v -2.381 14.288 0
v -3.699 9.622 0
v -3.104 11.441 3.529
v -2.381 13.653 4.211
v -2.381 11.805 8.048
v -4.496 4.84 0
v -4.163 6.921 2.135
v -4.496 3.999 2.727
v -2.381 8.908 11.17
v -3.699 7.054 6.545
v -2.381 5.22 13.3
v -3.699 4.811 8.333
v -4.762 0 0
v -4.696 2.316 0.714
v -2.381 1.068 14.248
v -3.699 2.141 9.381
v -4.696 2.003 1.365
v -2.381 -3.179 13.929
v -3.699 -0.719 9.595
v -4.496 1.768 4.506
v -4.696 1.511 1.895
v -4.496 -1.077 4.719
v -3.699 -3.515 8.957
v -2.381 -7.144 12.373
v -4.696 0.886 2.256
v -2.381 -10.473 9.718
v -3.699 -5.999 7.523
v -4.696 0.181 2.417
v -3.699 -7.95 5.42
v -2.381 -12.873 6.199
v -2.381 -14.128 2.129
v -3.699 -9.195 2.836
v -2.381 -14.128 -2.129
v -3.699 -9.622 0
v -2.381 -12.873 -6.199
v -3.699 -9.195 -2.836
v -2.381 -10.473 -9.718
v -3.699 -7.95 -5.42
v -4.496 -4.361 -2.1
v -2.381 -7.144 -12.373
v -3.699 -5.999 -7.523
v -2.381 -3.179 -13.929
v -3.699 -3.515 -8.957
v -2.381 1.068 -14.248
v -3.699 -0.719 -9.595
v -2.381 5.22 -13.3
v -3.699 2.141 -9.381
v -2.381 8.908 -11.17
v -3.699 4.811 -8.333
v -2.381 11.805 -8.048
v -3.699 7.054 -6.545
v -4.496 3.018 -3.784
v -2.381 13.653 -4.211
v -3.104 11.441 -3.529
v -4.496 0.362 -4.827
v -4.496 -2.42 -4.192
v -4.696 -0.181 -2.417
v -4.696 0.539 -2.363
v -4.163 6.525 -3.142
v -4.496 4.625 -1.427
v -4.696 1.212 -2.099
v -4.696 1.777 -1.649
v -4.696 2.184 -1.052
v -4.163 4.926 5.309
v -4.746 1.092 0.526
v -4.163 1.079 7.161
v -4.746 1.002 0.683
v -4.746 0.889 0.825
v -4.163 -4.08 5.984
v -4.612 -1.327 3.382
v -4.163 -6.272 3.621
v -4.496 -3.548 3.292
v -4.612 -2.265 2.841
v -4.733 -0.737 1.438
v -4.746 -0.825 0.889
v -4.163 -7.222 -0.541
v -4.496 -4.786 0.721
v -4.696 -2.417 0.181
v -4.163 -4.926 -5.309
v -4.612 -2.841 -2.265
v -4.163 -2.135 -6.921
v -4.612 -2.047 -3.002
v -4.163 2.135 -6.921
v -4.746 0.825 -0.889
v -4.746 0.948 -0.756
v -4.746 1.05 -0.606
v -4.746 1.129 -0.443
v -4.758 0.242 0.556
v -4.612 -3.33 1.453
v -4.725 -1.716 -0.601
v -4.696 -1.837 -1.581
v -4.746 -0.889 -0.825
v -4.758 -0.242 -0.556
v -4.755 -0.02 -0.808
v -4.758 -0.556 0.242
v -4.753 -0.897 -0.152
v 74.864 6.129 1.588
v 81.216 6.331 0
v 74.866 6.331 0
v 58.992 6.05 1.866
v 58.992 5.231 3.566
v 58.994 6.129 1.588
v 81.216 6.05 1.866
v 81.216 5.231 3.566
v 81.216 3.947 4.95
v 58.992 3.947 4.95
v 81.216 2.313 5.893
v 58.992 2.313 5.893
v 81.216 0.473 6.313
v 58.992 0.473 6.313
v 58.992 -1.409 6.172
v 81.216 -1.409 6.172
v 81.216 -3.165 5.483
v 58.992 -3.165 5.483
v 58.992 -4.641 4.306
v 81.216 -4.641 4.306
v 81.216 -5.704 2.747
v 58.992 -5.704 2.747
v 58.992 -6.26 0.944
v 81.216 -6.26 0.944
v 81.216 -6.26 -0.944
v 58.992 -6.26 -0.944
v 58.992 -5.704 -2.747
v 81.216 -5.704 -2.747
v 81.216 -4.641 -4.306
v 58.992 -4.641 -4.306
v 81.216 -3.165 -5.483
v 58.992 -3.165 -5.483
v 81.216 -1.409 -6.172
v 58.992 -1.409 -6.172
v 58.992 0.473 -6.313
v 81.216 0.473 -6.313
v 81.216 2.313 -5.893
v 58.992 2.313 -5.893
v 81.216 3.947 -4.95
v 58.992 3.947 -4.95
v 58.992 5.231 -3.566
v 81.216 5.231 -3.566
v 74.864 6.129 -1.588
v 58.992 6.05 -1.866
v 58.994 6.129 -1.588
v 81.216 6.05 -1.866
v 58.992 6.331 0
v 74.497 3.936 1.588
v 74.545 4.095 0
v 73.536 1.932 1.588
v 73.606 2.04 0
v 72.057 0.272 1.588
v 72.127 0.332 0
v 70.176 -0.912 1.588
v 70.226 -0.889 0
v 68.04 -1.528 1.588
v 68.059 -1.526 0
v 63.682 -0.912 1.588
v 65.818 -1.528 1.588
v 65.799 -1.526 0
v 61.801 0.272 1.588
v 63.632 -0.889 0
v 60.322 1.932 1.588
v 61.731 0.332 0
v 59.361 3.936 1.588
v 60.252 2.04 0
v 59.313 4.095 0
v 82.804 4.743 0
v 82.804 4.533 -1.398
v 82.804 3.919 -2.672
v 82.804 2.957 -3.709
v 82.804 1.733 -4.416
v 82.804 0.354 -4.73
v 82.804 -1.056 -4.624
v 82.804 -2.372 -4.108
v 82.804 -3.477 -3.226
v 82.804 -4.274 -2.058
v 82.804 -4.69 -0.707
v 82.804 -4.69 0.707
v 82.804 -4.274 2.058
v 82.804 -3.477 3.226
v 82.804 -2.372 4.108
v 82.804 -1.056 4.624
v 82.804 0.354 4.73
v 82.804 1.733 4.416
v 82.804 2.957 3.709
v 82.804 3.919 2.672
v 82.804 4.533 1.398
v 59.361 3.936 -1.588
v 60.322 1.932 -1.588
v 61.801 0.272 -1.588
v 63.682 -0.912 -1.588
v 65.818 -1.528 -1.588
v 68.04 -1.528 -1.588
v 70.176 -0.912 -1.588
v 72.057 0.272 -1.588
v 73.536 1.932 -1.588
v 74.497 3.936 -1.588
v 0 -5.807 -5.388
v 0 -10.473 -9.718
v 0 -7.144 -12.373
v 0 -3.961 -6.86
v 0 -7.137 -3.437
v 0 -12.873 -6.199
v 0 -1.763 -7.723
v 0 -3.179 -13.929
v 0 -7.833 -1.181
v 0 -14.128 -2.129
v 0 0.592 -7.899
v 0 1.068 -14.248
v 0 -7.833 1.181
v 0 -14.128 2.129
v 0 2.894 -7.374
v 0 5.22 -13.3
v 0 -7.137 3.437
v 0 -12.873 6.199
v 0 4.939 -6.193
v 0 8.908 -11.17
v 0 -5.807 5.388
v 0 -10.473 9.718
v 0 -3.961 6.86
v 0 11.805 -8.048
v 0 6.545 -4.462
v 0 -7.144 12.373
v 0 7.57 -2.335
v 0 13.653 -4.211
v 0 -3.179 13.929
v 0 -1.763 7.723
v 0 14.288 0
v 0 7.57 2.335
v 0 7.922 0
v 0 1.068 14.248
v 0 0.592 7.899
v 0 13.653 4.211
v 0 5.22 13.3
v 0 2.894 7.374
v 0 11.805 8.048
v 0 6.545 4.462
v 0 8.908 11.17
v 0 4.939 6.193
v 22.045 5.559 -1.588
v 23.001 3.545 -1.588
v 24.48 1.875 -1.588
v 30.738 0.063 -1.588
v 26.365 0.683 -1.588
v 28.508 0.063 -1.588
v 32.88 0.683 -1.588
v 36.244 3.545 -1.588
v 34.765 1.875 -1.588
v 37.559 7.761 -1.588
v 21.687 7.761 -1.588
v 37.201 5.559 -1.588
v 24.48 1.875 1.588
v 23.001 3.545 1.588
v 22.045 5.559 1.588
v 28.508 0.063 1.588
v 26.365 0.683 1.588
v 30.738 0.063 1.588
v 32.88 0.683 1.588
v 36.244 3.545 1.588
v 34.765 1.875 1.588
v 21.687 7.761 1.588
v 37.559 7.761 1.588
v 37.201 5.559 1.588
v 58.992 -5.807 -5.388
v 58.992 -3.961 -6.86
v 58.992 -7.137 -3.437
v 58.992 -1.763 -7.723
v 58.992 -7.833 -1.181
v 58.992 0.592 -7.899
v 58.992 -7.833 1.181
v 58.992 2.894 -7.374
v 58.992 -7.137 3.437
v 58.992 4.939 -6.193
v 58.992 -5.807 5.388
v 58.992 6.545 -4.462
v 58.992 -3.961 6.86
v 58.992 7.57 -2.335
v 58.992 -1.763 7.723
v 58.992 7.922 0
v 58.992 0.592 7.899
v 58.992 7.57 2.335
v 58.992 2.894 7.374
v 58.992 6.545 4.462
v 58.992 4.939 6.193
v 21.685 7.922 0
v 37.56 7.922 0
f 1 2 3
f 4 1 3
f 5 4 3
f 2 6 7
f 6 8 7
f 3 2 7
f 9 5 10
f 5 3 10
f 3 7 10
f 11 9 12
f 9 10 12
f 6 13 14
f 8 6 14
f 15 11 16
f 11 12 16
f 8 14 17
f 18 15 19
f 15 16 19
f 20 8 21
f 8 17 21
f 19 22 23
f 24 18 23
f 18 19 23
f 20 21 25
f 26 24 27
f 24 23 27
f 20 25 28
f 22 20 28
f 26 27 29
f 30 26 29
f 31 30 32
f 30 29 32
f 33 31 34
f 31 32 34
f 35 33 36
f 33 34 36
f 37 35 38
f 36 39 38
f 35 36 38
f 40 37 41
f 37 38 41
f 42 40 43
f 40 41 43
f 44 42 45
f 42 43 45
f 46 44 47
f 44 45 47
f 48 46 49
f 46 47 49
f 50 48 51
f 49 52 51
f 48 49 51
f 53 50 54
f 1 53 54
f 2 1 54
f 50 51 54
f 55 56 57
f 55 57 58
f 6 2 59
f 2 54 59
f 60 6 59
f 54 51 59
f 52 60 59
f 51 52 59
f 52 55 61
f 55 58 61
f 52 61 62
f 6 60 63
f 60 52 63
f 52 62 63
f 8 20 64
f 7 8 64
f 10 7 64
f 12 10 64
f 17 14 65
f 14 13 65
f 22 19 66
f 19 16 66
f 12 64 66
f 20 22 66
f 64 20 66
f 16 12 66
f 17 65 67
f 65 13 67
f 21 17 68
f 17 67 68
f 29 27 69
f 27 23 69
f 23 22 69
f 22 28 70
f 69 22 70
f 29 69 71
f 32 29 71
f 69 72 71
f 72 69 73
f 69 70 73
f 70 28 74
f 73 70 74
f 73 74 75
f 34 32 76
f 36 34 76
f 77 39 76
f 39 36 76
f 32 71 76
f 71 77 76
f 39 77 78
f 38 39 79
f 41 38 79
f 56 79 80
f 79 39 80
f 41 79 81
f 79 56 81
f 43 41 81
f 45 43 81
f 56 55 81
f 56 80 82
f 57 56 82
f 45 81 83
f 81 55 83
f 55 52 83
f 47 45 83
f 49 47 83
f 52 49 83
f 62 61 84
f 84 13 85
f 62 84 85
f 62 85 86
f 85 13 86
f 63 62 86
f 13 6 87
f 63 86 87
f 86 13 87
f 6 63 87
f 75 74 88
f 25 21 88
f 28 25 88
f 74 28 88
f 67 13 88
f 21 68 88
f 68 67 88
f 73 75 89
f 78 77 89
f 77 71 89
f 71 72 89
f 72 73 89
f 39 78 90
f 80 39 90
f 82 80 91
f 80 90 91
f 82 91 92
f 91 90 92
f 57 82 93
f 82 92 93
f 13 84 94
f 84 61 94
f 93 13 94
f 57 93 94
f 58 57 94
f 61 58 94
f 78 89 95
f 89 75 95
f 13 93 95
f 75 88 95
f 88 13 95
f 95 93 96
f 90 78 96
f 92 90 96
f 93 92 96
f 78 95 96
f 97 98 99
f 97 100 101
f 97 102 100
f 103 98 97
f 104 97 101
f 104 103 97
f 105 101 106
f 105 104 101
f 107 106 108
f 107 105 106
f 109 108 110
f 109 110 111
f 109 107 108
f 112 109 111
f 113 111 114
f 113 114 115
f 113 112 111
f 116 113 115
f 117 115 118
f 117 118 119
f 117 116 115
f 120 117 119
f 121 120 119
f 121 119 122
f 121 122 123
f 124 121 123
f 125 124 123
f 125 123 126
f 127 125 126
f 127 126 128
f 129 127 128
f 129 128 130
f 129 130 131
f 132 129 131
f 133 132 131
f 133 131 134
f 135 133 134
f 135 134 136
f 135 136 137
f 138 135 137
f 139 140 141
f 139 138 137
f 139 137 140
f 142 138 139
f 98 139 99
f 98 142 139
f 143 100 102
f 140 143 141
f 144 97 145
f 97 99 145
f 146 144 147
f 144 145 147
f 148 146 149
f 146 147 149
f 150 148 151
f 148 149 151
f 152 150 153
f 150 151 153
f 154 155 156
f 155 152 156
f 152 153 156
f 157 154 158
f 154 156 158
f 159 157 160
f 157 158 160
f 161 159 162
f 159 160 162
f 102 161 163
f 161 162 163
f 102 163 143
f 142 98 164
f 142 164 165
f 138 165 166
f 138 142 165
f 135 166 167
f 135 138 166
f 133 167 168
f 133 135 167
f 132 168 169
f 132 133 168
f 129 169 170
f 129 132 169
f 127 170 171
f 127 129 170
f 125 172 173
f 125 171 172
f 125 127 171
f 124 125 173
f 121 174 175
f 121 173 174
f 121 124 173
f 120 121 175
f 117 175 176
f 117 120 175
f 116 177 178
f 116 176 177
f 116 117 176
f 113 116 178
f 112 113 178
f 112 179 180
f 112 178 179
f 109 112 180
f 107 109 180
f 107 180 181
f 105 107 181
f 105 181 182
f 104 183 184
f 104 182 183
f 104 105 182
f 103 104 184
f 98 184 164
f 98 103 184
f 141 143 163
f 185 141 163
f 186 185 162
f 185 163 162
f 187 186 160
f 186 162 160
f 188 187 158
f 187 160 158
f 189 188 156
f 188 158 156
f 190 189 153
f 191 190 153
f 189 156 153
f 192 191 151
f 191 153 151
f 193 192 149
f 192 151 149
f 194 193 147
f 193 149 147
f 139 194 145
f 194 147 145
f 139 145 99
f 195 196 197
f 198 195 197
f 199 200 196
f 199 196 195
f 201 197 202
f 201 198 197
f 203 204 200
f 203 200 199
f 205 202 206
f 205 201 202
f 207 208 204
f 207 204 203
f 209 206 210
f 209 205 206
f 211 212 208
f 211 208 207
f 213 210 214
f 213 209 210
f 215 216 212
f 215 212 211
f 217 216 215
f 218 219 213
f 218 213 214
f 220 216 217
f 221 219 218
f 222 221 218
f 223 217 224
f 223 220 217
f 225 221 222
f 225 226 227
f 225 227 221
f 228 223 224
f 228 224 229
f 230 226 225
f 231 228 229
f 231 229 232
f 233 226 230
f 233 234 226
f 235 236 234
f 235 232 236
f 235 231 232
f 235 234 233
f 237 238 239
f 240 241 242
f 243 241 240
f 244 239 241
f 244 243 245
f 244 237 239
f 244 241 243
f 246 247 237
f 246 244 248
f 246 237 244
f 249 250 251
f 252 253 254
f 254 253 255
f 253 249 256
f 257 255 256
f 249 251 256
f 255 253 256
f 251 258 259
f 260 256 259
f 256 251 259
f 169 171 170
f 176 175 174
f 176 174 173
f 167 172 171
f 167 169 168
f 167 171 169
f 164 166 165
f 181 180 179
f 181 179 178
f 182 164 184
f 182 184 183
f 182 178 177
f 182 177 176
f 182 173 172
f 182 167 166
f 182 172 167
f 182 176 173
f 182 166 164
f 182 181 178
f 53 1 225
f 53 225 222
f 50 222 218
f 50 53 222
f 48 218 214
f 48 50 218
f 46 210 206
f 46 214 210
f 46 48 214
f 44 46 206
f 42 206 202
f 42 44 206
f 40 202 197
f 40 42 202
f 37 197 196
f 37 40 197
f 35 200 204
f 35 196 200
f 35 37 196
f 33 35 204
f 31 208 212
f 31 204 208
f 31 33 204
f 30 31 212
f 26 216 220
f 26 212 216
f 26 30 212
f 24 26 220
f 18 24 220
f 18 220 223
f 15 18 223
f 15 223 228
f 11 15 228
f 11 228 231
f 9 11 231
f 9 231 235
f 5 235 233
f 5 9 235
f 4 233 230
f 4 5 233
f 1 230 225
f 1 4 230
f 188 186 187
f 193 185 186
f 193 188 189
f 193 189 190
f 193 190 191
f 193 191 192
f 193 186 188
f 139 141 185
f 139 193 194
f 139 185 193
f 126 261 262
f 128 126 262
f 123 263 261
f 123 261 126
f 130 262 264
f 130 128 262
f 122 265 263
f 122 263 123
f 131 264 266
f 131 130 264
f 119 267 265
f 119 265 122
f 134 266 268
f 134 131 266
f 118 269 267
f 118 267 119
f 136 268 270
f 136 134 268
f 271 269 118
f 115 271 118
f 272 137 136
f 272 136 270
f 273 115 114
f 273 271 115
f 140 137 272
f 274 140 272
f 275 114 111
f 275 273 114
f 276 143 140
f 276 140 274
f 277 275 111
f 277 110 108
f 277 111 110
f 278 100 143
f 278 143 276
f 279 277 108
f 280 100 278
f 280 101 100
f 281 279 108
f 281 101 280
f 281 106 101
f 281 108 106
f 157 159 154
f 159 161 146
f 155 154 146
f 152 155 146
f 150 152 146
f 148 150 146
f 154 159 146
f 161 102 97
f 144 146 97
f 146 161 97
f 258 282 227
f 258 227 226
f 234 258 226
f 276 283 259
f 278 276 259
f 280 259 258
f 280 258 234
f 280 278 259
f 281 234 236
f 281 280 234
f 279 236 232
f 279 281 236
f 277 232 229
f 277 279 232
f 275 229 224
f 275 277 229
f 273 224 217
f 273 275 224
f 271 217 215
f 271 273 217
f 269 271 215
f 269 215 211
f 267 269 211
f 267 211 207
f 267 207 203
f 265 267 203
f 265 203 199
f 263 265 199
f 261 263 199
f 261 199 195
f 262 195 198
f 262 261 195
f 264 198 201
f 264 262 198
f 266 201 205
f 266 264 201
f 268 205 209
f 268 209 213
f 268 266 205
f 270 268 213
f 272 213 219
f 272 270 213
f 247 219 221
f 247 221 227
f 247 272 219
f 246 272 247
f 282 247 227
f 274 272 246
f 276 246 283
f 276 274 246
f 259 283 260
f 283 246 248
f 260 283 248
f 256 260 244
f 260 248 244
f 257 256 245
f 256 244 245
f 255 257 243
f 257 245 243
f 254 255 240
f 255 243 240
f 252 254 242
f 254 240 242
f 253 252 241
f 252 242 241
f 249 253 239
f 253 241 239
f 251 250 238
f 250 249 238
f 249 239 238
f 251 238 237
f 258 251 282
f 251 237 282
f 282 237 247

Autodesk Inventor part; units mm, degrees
ref_plane "YZ Plane" through (0, 0, 0) normal (1, 0, 0) x (0, 1, 0)
ref_plane "XZ Plane" through (0, 0, 0) normal (0, 1, 0) x (-1, 0, 0)
ref_plane "XY Plane" through (0, 0, 0) normal (0, 0, 1) x (1, 0, 0)
sketch "Sketch1" plane through (0, 0, 0) normal (0, 0, 1) x (1, 0, 0)
  line L0 (58.9915, 7.9216) -> (58.9915, 6.3309)
  line L1 (58.9915, 6.3309) -> (82.804, 6.3309)
  line L2 (-22.9853, 0) -> (100.4355, 0) projected
  line L3 (0, 7.9216) -> (58.9915, 7.9216)
  line L4 (0, 0) -> (0, 14.2875) construction
  line L5 (0, -5.5981) -> (0, 33.5884) construction
  line L6 (0, 14.2875) -> (0, 7.9216)
  line L7 (82.804, 6.3309) -> (82.804, 0)
  line L8 (-4.7625, 0) -> (82.804, 0)
  line L9 (-4.7625, 0) -> (-4.7625, 27.9903) construction
  line L10 (0, 14.2875) -> (-2.3813, 14.2875)
  arc A0 (-2.3813, 14.2875) -> (-4.7625, 0) centre (39.2906, 0) ccw
  dimension "d4" = 15.8432
  dimension "d6" = 23.8125
  dimension "d8" = 58.9915
  dimension "d9" = 12.6619
  dimension "d10" = 0
  dimension "d16" = 2.3813
  dimension "d17" = 2.3813
  dimension "d18" = 28.575
revolve "Revolution1" add sketch "Sketch1" angle 360 about axis through (-10, 0, 0) along (1, 0, 0)
sketch "Sketch2" plane through (0, 0, 0) normal (0, 0, 1) x (1, 0, 0)
  circle A0 centre (29.6227, 7.9216) radius 7.9375
  circle A1 centre (66.929, 6.3309) radius 7.9375
  line L0 (58.9915, -7.9216) -> (58.9915, 7.9216) construction
  line L1 (0, 7.9216) -> (58.9915, 7.9216) construction
  line L2 (58.9915, 6.3309) -> (82.804, 6.3309) construction
  point P0 (0, 0)
  dimension "d20" = 29.3687
  dimension "d21" = 7.9375
  dimension "d22" = 15.875
  dimension "d23" = 0
  dimension "d24" = 0
extrude "Extrusion1" cut sketch "Sketch2" along normal mid plane 3.175
chamfer "Chamfer1" distance 1.5875 angle 45 1 edges at (82.804, -6.3309, 0)
thread "Thread1" size "1/2-13 UNC" class "2A" standard "ANSI Unified Screw Threads" length 11.9062
equation "\"d17\" = d16"
properties part number "Flecha del engrane" material "Aluminum 6061"
